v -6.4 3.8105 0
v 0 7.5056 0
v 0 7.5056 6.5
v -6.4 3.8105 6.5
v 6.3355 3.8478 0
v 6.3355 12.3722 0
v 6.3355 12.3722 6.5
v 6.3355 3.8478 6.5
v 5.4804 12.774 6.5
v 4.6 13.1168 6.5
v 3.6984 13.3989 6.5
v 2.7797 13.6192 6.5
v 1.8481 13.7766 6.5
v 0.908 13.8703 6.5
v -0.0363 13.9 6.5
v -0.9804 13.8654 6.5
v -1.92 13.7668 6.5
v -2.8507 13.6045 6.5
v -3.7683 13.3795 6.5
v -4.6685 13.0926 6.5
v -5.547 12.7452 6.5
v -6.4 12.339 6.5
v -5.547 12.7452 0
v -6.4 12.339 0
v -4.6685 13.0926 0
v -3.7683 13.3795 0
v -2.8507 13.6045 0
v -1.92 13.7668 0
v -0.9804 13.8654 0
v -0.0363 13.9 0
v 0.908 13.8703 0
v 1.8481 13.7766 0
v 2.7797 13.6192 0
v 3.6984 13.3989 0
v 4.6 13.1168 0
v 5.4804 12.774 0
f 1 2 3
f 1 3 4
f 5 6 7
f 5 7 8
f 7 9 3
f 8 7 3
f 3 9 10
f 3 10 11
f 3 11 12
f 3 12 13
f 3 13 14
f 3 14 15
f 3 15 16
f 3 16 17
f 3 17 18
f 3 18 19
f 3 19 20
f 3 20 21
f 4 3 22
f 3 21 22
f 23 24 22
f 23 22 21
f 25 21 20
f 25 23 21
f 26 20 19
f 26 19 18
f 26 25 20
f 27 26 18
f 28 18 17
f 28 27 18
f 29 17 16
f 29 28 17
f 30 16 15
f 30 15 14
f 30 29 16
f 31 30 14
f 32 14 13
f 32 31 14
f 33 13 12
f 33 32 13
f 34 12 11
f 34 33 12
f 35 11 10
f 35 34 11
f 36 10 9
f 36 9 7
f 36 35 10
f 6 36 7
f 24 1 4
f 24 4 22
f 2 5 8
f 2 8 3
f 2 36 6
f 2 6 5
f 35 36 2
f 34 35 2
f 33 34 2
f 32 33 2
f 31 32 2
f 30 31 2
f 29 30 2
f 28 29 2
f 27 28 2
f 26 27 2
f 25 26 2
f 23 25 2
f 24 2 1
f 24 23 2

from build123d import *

# Parameters (mm, degrees)
BOSS_EXTRUDE1_DEPTH = 6.5


with BuildPart() as part:
    # Sketch1 → Boss-Extrude1 (new body)
    with BuildSketch(Plane.XY):
        with BuildLine():
            Line((6.335498205, 3.847751906), (0, 7.505553499))
            Line((0, 7.505553499), (-6.4, 3.810511777))
            Line((-6.4, 3.810511777), (-6.4, 12.338962679))
            ThreePointArc((-6.4, 12.338962679), (-0.036282053, 13.899952648), (6.335498205, 12.37220524))
            Line((6.335498205, 12.37220524), (6.335498205, 3.847751906))
        make_face()
    extrude(amount=BOSS_EXTRUDE1_DEPTH)


solid = part.part
